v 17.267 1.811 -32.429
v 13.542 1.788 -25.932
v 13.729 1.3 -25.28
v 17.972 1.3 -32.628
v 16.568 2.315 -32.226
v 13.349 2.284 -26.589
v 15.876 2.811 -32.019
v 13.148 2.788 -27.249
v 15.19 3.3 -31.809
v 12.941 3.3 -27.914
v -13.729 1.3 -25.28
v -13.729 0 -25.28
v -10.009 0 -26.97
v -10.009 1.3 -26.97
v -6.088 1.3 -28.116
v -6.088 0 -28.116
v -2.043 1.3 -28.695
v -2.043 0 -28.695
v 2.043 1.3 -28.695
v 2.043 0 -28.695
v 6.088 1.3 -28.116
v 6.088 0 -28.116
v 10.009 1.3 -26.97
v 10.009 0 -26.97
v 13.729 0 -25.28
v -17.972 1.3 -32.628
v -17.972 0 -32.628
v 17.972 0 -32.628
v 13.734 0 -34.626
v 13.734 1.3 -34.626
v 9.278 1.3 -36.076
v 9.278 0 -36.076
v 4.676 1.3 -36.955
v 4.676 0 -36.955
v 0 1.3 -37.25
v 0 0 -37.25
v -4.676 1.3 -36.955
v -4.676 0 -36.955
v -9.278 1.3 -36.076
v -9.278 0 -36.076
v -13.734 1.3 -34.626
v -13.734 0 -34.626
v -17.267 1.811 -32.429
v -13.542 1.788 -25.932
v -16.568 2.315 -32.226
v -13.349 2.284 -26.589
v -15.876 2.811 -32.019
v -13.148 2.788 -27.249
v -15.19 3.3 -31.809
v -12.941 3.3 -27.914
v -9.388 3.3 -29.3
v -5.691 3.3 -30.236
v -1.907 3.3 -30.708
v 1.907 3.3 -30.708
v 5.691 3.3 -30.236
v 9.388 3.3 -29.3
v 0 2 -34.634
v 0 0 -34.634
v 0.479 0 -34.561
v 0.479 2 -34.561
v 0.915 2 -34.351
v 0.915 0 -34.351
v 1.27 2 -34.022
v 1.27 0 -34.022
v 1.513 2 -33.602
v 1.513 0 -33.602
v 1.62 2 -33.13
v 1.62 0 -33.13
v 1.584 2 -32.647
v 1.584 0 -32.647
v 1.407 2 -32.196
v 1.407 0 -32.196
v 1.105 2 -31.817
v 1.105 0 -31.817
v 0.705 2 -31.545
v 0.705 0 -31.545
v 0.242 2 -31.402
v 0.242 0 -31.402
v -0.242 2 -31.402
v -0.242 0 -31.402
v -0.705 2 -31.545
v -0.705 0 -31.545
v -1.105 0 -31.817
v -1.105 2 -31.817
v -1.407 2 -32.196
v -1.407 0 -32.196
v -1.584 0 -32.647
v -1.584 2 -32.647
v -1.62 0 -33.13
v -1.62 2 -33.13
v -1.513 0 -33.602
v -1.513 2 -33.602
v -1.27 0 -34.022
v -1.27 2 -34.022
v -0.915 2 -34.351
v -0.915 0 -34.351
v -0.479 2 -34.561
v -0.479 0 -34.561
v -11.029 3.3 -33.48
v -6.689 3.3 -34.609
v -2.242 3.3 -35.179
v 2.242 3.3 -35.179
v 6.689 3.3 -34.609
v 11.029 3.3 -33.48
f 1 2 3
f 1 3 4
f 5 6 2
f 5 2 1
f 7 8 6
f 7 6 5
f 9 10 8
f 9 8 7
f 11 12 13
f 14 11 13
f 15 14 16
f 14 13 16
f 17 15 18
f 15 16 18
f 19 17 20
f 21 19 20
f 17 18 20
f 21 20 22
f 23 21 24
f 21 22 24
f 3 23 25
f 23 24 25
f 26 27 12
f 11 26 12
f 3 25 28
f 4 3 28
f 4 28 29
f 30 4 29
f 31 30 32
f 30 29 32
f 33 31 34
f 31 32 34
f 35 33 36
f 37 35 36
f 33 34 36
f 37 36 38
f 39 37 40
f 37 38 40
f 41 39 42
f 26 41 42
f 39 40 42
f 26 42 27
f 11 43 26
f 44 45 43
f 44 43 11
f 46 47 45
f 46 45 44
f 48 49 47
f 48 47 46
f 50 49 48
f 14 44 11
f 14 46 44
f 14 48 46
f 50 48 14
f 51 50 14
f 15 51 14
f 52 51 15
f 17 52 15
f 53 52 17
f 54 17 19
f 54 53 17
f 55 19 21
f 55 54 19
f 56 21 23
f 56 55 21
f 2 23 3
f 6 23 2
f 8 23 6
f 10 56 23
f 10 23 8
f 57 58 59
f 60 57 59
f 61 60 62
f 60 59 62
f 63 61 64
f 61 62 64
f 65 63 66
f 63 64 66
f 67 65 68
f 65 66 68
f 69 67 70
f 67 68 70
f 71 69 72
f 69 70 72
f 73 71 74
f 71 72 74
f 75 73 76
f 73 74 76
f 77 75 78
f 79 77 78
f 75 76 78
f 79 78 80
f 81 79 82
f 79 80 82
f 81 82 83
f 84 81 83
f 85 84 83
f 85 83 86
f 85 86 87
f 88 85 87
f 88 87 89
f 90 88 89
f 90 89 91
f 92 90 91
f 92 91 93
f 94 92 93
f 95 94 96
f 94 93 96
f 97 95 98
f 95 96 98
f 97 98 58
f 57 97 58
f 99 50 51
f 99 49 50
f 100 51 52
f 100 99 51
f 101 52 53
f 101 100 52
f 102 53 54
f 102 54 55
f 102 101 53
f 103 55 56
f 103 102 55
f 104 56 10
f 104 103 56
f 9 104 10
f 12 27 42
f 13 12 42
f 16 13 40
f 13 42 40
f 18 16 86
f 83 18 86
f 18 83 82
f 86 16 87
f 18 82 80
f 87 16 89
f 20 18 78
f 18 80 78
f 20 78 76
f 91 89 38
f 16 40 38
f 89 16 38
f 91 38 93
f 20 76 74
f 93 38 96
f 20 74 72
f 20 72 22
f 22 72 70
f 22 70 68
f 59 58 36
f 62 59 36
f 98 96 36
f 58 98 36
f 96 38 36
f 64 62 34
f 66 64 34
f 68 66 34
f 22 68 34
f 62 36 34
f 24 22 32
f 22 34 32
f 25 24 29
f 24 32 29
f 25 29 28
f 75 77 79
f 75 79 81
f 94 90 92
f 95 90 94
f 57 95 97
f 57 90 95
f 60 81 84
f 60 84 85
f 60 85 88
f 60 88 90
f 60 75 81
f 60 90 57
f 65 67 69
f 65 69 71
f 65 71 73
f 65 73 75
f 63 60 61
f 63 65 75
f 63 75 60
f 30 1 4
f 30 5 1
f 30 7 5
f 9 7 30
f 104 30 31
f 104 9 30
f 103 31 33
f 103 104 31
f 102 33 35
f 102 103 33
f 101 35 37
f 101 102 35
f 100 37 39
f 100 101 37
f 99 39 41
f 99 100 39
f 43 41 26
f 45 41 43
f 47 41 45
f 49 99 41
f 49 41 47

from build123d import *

# Parameters (mm, degrees)
BOSS_EXTRUDE1_DEPTH = 3.3
CHAMFER1_SIZE       = 2
SKETCH2_R           = 1.625
CUT_EXTRUDE1_DEPTH  = 2


with BuildPart() as part:
    # Sketch1 → Boss-Extrude1 (new body)
    with BuildSketch(Plane(origin=(0, 0, 0), x_dir=(1, 0, 0), z_dir=(0, 1, 0))):
        with BuildLine():
            Line((-17.971705397, 32.627906846), (-13.729256498, 25.279769804))
            ThreePointArc((-13.729256498, 25.279769804), (0, 28.767329478), (13.729256498, 25.279769804))
            Line((13.729256498, 25.279769804), (17.971705397, 32.627906846))
            ThreePointArc((17.971705397, 32.627906846), (0, 37.25), (-17.971705397, 32.627906846))
        make_face()
    extrude(amount=BOSS_EXTRUDE1_DEPTH)

    # Chamfer1
    chamfer1_edges = [part.edges().sort_by_distance(p)[0] for p in [
        (0, 3.3, -28.767329478),
        (15.850480947, 3.3, -28.953838325),
        (0, 3.3, -37.25),
        (-15.850480947, 3.3, -28.953838325),
    ]]
    chamfer(chamfer1_edges, length=CHAMFER1_SIZE)

    # Sketch2 → Cut-Extrude1 (cut)
    with BuildSketch(Plane.XZ):
        with Locations(Location((0, -33.008664739, 0), (0, 0, 270))):
            Circle(SKETCH2_R)
    extrude(amount=-CUT_EXTRUDE1_DEPTH, mode=Mode.SUBTRACT)


solid = part.part
